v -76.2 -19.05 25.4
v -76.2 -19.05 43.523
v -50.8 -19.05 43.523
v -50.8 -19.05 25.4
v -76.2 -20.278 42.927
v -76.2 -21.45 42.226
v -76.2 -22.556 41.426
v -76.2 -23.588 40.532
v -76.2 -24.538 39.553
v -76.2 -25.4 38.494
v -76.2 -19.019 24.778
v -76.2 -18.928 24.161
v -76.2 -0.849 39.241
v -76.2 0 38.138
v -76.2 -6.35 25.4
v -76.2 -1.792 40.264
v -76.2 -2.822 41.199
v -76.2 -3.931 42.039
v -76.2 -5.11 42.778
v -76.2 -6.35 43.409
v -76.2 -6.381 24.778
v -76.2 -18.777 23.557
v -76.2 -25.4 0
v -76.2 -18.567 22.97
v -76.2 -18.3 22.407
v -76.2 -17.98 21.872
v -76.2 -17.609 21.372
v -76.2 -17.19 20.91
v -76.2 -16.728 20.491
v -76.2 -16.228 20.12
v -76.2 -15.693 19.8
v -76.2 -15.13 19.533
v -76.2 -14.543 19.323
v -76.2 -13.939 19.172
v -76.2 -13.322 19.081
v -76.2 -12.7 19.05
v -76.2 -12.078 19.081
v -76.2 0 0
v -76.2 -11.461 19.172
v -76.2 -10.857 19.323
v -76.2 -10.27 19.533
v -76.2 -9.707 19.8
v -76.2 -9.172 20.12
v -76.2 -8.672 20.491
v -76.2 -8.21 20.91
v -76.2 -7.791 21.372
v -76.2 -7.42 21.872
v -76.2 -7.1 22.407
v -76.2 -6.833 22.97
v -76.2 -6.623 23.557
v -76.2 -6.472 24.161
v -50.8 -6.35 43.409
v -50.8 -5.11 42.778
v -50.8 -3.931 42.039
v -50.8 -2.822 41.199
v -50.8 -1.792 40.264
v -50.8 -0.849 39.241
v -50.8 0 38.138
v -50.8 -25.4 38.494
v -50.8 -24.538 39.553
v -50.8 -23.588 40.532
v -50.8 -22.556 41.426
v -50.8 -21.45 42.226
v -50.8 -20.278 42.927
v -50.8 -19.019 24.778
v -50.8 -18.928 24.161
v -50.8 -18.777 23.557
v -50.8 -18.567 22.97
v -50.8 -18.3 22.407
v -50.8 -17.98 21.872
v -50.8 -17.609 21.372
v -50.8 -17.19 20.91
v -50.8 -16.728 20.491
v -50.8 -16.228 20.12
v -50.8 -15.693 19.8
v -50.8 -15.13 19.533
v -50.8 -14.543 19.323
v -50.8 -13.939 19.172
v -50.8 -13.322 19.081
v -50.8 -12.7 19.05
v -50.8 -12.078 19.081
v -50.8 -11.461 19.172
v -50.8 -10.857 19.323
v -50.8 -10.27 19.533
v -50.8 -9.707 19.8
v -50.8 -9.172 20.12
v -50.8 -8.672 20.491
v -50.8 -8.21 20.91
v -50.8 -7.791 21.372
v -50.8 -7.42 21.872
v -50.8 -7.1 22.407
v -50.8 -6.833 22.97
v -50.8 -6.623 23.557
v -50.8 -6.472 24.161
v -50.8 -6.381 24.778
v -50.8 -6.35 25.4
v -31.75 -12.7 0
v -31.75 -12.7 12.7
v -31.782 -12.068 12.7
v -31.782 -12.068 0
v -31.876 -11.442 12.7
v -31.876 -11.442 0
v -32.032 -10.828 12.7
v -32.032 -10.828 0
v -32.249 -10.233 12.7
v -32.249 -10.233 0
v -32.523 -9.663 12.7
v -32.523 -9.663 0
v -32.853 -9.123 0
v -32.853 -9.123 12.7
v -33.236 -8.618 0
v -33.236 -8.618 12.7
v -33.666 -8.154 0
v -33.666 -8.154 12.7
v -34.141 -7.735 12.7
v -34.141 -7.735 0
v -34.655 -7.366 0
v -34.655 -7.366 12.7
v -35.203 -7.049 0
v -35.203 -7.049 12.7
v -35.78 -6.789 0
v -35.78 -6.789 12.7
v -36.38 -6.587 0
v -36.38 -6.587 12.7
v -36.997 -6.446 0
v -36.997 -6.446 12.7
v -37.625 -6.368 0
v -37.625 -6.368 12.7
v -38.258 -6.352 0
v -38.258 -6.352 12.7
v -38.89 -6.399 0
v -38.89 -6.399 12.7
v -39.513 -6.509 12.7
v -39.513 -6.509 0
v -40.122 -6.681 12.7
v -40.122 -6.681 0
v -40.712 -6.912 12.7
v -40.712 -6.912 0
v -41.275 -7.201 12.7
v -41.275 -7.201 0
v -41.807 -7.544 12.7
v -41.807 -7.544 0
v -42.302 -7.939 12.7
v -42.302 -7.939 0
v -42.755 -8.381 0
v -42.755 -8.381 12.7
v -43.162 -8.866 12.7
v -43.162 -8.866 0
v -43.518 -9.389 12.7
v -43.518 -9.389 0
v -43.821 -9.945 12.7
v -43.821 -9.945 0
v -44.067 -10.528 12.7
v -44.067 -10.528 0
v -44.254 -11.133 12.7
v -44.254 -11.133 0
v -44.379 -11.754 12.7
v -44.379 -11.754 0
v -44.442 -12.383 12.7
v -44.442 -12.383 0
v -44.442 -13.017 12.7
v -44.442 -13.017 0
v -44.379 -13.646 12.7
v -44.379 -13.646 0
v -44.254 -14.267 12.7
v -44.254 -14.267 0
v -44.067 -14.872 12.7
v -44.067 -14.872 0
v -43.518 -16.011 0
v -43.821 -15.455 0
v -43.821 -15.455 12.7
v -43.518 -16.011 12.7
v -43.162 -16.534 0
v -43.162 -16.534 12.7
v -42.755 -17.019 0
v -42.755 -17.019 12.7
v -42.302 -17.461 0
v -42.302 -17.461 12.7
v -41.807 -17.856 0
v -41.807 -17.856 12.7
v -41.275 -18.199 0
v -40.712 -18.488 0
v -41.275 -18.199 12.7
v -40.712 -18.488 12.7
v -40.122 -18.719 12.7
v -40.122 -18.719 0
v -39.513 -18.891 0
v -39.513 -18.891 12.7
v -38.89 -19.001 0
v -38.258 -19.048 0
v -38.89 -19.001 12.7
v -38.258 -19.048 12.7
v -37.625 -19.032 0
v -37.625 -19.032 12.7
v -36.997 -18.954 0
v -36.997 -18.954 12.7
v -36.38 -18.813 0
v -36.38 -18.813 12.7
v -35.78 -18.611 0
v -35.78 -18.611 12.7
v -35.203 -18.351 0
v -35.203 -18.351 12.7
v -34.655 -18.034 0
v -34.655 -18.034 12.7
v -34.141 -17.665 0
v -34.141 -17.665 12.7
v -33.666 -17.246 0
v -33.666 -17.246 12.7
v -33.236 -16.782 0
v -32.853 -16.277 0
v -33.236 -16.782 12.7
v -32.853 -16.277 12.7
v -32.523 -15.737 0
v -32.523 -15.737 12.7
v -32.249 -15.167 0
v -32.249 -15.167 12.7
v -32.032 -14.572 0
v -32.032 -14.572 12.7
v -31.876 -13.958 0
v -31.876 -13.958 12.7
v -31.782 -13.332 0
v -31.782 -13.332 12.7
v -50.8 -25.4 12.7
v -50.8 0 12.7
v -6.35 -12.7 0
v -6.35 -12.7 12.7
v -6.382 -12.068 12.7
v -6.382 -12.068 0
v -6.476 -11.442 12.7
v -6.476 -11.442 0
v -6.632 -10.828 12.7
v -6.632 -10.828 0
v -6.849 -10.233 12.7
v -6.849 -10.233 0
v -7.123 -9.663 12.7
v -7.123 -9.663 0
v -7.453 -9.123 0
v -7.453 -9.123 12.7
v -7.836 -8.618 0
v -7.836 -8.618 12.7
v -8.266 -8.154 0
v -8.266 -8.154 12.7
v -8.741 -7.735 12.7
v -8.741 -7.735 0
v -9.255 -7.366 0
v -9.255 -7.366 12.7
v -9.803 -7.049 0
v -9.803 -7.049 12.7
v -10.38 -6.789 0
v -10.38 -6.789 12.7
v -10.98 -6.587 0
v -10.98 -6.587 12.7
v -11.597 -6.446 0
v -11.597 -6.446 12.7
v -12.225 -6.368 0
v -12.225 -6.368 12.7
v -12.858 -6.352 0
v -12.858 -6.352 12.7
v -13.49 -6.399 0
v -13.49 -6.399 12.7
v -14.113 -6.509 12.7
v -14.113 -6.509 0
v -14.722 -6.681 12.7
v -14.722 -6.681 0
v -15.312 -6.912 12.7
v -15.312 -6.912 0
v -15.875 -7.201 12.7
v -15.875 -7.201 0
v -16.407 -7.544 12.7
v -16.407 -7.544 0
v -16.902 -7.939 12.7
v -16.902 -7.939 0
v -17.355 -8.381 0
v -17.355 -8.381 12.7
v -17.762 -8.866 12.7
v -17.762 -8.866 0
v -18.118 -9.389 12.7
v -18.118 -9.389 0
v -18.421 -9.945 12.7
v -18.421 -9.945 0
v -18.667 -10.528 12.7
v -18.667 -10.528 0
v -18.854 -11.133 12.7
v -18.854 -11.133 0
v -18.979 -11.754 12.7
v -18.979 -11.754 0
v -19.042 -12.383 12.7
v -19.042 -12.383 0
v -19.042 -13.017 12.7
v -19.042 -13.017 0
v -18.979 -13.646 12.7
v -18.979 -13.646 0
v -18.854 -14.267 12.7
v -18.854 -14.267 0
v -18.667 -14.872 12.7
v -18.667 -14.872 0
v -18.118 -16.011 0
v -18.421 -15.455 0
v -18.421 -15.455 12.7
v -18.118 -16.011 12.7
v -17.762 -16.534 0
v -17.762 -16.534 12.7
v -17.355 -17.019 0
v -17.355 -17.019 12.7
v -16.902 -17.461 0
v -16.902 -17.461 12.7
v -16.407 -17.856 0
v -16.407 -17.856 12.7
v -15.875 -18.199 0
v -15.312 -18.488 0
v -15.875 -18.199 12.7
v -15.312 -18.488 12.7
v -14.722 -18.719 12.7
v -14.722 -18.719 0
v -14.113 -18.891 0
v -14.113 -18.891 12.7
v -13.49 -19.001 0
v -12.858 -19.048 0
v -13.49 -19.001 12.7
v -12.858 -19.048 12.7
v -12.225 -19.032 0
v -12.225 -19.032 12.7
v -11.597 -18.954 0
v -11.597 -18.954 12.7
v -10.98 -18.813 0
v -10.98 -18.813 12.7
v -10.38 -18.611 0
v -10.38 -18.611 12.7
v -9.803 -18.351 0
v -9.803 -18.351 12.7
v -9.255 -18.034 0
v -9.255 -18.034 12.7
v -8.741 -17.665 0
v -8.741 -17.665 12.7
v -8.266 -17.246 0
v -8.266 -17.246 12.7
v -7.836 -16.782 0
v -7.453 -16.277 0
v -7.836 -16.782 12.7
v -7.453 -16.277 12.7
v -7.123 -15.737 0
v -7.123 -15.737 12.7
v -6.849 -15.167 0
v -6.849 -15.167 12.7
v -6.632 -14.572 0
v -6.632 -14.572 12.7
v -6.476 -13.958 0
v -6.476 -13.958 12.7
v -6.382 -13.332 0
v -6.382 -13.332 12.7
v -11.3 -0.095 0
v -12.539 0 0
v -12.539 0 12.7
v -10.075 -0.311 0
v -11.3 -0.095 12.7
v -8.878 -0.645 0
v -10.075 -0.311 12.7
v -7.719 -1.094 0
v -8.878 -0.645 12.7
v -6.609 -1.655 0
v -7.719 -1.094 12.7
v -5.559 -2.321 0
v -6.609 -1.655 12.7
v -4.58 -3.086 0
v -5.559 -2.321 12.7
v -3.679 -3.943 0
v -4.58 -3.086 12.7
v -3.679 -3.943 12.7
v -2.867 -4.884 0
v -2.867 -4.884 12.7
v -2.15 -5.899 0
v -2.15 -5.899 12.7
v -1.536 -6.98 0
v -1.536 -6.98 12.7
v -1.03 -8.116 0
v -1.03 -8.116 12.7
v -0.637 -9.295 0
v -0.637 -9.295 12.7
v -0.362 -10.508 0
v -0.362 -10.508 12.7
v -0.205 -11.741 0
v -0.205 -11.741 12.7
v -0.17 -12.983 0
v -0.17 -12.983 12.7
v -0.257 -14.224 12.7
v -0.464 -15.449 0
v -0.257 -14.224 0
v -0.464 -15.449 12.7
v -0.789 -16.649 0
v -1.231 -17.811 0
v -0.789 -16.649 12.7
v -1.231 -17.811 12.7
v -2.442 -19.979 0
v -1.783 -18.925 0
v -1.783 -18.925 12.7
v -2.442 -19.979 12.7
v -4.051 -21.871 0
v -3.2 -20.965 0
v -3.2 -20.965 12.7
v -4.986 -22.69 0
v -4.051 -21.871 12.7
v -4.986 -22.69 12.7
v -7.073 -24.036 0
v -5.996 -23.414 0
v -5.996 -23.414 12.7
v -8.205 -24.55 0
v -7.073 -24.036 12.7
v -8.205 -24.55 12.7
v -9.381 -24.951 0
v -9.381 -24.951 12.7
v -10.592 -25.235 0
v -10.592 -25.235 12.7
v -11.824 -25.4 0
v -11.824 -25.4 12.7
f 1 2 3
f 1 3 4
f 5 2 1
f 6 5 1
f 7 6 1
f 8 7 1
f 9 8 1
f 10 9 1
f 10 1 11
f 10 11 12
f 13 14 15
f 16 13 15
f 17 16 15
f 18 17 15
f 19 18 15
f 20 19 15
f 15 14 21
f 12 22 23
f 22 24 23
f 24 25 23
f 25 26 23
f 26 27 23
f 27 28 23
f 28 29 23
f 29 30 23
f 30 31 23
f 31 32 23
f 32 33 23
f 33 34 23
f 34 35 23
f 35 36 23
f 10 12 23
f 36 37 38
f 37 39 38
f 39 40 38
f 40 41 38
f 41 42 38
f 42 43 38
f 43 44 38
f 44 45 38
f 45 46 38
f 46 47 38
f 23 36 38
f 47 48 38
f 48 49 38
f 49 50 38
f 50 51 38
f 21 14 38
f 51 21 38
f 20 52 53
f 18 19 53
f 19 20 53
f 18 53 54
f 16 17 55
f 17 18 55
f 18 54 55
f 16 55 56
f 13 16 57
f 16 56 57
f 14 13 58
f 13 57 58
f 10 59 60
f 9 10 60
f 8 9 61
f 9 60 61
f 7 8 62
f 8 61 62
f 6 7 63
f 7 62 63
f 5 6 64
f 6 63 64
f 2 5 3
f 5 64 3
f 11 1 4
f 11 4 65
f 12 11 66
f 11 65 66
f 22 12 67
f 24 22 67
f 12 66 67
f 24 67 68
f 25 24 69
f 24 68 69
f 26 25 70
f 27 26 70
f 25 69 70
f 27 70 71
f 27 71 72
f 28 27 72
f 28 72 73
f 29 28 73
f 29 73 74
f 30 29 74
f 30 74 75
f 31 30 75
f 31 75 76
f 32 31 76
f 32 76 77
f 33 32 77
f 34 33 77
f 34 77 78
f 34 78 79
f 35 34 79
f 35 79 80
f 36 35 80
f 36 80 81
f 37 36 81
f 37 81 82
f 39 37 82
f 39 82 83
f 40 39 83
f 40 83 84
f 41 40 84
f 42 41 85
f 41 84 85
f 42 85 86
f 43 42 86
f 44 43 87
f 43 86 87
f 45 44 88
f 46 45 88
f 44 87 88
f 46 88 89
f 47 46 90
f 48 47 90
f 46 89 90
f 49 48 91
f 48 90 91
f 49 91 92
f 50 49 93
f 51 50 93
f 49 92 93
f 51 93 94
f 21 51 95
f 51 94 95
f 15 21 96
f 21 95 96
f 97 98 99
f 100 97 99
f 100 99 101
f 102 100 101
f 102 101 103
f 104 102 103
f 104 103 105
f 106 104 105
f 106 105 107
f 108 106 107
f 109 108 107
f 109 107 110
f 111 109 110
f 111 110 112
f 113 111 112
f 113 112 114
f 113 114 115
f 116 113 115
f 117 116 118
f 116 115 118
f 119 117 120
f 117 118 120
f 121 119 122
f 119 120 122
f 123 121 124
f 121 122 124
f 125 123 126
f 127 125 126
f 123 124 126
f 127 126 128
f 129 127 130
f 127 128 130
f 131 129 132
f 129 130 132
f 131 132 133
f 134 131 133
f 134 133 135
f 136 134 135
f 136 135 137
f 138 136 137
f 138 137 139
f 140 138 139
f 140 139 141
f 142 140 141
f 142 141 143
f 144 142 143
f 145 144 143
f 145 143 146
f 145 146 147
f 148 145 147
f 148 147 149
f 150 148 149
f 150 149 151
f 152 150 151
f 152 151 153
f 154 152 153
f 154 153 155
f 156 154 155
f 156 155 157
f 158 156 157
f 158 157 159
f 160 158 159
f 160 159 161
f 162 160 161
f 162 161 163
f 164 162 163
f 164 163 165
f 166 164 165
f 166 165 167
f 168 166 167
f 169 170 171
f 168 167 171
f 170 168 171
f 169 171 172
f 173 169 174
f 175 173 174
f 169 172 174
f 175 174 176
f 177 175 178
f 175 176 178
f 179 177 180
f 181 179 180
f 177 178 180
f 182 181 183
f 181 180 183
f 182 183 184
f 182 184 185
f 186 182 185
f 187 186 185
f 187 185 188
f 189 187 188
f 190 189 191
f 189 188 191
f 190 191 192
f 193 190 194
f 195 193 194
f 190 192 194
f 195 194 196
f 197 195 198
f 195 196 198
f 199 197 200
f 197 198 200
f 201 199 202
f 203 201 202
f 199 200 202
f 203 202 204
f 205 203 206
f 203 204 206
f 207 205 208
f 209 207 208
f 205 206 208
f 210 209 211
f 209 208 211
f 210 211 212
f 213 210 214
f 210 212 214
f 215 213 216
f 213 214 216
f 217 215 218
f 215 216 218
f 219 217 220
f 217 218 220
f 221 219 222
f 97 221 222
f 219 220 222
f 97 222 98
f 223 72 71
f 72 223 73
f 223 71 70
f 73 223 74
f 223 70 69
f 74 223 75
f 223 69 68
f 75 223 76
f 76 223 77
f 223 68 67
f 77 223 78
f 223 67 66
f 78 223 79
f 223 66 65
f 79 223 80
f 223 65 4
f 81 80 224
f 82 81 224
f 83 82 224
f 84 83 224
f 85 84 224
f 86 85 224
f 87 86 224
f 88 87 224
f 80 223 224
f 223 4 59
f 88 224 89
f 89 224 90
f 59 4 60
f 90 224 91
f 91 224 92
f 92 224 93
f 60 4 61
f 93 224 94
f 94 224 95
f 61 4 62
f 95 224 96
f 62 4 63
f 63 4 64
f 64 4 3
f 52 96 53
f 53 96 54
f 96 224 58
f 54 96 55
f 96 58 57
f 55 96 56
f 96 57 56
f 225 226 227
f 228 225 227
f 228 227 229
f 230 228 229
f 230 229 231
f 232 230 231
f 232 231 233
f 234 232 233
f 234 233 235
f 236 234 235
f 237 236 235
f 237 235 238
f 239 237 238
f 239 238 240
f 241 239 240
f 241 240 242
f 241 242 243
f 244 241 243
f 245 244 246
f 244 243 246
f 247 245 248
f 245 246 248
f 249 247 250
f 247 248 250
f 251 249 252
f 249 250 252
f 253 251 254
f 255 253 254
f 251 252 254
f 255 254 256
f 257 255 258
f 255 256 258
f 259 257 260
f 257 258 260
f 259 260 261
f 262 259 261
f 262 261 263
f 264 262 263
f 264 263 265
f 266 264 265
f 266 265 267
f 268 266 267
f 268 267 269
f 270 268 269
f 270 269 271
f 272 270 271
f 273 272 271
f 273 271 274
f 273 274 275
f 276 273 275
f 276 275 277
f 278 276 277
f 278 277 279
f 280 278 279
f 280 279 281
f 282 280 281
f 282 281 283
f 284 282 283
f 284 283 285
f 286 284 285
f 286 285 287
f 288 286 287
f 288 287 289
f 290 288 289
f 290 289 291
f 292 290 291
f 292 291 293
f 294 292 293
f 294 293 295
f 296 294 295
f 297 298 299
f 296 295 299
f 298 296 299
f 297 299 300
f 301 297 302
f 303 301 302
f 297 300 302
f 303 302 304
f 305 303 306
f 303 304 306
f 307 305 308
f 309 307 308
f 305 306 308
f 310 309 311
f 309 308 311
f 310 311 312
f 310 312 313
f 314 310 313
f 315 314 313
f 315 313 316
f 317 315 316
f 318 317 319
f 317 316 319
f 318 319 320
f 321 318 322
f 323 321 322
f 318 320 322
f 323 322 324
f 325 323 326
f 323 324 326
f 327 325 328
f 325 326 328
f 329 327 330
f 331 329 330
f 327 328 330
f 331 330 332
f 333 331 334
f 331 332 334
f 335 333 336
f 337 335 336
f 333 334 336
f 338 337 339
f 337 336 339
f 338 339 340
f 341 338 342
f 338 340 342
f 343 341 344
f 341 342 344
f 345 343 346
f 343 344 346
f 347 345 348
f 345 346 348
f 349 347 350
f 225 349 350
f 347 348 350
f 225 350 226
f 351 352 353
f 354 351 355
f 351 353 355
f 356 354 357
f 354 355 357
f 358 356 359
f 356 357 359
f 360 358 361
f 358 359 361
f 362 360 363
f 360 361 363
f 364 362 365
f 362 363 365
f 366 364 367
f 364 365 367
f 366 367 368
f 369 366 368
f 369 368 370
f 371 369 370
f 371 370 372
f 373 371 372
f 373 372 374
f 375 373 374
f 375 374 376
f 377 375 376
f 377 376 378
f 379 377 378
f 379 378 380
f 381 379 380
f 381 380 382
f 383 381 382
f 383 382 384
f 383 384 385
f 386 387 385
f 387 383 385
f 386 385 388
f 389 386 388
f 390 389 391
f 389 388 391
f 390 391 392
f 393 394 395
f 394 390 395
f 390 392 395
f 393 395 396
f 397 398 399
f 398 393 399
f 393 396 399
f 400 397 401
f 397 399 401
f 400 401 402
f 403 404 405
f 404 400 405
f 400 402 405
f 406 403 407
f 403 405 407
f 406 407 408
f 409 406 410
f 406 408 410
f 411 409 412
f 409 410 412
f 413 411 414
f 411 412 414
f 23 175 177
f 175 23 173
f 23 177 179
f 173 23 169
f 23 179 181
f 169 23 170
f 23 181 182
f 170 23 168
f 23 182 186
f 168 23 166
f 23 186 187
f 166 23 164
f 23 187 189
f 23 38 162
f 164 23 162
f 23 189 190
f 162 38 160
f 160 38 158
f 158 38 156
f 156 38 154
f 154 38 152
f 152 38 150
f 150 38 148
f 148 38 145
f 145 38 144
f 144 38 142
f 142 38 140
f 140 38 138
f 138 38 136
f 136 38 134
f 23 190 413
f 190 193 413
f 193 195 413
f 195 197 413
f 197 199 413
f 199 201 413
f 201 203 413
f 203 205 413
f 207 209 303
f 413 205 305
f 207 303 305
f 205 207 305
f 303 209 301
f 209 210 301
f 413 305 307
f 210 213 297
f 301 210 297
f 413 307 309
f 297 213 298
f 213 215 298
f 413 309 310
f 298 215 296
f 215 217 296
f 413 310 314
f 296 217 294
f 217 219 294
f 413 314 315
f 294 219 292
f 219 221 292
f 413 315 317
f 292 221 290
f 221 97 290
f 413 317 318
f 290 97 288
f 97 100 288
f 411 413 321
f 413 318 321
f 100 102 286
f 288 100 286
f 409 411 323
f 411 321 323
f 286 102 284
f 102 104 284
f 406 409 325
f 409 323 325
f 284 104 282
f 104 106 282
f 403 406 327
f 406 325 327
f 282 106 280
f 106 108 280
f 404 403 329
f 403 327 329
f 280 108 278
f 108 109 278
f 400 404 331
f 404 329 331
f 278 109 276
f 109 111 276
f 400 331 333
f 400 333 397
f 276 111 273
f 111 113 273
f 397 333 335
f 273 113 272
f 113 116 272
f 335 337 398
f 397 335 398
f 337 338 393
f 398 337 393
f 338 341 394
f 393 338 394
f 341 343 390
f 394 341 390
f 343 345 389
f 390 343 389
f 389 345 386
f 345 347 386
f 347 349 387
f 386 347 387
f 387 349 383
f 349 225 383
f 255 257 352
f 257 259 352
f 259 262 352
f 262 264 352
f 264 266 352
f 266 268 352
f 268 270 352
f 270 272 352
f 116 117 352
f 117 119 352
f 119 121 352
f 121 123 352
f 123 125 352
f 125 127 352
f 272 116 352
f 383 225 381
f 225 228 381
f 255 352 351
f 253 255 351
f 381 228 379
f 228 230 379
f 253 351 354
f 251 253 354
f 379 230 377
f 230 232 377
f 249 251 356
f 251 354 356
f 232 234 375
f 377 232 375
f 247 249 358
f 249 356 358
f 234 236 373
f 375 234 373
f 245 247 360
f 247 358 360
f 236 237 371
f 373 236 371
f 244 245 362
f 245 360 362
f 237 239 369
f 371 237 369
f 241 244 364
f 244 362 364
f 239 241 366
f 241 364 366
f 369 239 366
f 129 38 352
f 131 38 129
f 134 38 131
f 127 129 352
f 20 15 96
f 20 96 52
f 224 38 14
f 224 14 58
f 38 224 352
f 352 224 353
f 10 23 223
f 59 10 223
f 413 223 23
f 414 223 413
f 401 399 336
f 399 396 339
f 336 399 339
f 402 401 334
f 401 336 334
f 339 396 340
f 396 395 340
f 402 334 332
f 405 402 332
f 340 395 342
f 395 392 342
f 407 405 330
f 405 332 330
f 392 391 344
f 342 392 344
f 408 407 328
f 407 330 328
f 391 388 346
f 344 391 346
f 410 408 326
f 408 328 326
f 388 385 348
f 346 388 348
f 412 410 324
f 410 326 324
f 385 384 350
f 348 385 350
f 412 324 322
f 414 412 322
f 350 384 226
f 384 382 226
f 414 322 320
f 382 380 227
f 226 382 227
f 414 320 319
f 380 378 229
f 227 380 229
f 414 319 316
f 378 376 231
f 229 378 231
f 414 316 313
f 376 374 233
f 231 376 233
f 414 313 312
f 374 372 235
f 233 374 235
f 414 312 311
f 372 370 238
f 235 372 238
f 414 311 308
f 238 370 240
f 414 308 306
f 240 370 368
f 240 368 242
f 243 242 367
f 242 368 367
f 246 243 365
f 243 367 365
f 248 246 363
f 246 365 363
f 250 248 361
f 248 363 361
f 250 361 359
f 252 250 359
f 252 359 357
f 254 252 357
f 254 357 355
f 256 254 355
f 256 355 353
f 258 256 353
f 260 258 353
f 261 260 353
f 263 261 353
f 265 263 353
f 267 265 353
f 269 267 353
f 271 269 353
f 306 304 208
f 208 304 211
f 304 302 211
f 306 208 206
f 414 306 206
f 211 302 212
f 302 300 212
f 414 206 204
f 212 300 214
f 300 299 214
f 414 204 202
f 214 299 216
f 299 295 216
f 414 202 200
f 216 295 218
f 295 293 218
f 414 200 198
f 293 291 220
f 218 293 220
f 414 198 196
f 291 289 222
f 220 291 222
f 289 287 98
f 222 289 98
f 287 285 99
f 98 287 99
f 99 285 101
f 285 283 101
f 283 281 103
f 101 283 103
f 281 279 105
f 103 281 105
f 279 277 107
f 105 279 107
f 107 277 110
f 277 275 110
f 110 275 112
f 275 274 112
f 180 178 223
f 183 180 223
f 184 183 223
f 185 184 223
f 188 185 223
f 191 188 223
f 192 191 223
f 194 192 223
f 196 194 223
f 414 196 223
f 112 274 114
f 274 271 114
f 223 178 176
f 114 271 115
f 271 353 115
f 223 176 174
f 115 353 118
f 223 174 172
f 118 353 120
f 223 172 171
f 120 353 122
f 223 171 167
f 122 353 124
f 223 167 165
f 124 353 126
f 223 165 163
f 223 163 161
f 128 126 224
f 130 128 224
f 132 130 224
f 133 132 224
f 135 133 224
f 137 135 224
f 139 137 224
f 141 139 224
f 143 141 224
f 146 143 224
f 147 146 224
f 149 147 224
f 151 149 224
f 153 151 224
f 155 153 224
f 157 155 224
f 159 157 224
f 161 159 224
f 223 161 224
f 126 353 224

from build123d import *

# Parameters (mm, degrees)
F1_DEPTH = 25.4
F2_R     = 6.35
F3_DEPTH = 25.4
F5_DEPTH = 76.201
F7_DEPTH = 25.401
F9_DEPTH = 12.701


# Not quite as in the source:
# - ends of sketch curves that miss each other by under 0.0002 mm in the source are joined


with BuildPart() as f1:
    # F0 (on Front) → F1 (new body)
    with BuildSketch(Plane.XZ):
        Polygon((-50.8, 44.45), (-76.2, 44.45), (-76.2, 0), (0, 0), (0, 12.7), (-50.8, 12.7), align=None)
    extrude(amount=F1_DEPTH)

    # F2 (on face) → F3 (cut)
    with BuildSketch(Plane.XY.offset(12.7)):
        with Locations((-38.1, -12.7)):
            Circle(F2_R)
        with Locations((-12.7, -12.7)):
            Circle(F2_R)
    extrude(amount=-F3_DEPTH, mode=Mode.SUBTRACT)

    # F4 (on Right) → F5 (cut, through all)
    with BuildSketch(Plane.YZ):
        with BuildLine():
            ThreePointArc((-19.05, 25.4), (-12.7, 19.05), (-6.35, 25.4))
            ThreePointArc((-6.35, 25.4), (-12.7, 31.75), (-19.05, 25.4))
        make_face()
        with BuildLine():
            ThreePointArc((-19.05, 25.4), (-12.7, 31.75), (-6.35, 25.4))
            Line((-6.35, 25.4), (-6.3499049408, 44.4847454087))
            Line((-6.3499049408, 44.4847454087), (-19.05, 44.5389002562))
            Line((-19.05, 44.5389002562), (-19.05, 25.4))
        make_face()
    extrude(amount=-F5_DEPTH, mode=Mode.SUBTRACT)

    # F6 (on face) → F7 (cut, through all)
    with BuildSketch(Plane.YZ.offset(-50.8)):
        with BuildLine():
            ThreePointArc((-25.4, 38.4937003255), (-22.5556194367, 41.4256632835), (-19.05, 43.5226945042))
            Line((-19.05, 43.5226945042), (-19.05, 44.45))
            Line((-19.05, 44.45), (-25.4, 44.45))
            Line((-25.4, 44.45), (-25.4, 38.4937003255))
        make_face()
        with BuildLine():
            ThreePointArc((-6.3499103, 43.4087842374), (-2.8217014128, 41.1990275697), (0, 38.1380990148))
            Line((0, 38.1380990148), (0, 44.45))
            Line((0, 44.45), (-6.3499051138, 44.45))
            Line((-6.3499051138, 44.45), (-6.3499103, 43.4087842374))
        make_face()
    extrude(amount=-F7_DEPTH, mode=Mode.SUBTRACT)

    # F8 (on face) → F9 (cut, through all)
    with BuildSketch(Plane.XY.offset(12.7)):
        with BuildLine():
            ThreePointArc((-12.5391965152, 0), (-0.172750427, -12.3617250524), (-11.8236998096, -25.4))
            Line((-11.8236998096, -25.4), (0, -25.4))
            Line((0, -25.4), (0, 0))
            Line((0, 0), (-12.5391965152, 0))
        make_face()
    extrude(amount=-F9_DEPTH, mode=Mode.SUBTRACT)


solid = f1.part
